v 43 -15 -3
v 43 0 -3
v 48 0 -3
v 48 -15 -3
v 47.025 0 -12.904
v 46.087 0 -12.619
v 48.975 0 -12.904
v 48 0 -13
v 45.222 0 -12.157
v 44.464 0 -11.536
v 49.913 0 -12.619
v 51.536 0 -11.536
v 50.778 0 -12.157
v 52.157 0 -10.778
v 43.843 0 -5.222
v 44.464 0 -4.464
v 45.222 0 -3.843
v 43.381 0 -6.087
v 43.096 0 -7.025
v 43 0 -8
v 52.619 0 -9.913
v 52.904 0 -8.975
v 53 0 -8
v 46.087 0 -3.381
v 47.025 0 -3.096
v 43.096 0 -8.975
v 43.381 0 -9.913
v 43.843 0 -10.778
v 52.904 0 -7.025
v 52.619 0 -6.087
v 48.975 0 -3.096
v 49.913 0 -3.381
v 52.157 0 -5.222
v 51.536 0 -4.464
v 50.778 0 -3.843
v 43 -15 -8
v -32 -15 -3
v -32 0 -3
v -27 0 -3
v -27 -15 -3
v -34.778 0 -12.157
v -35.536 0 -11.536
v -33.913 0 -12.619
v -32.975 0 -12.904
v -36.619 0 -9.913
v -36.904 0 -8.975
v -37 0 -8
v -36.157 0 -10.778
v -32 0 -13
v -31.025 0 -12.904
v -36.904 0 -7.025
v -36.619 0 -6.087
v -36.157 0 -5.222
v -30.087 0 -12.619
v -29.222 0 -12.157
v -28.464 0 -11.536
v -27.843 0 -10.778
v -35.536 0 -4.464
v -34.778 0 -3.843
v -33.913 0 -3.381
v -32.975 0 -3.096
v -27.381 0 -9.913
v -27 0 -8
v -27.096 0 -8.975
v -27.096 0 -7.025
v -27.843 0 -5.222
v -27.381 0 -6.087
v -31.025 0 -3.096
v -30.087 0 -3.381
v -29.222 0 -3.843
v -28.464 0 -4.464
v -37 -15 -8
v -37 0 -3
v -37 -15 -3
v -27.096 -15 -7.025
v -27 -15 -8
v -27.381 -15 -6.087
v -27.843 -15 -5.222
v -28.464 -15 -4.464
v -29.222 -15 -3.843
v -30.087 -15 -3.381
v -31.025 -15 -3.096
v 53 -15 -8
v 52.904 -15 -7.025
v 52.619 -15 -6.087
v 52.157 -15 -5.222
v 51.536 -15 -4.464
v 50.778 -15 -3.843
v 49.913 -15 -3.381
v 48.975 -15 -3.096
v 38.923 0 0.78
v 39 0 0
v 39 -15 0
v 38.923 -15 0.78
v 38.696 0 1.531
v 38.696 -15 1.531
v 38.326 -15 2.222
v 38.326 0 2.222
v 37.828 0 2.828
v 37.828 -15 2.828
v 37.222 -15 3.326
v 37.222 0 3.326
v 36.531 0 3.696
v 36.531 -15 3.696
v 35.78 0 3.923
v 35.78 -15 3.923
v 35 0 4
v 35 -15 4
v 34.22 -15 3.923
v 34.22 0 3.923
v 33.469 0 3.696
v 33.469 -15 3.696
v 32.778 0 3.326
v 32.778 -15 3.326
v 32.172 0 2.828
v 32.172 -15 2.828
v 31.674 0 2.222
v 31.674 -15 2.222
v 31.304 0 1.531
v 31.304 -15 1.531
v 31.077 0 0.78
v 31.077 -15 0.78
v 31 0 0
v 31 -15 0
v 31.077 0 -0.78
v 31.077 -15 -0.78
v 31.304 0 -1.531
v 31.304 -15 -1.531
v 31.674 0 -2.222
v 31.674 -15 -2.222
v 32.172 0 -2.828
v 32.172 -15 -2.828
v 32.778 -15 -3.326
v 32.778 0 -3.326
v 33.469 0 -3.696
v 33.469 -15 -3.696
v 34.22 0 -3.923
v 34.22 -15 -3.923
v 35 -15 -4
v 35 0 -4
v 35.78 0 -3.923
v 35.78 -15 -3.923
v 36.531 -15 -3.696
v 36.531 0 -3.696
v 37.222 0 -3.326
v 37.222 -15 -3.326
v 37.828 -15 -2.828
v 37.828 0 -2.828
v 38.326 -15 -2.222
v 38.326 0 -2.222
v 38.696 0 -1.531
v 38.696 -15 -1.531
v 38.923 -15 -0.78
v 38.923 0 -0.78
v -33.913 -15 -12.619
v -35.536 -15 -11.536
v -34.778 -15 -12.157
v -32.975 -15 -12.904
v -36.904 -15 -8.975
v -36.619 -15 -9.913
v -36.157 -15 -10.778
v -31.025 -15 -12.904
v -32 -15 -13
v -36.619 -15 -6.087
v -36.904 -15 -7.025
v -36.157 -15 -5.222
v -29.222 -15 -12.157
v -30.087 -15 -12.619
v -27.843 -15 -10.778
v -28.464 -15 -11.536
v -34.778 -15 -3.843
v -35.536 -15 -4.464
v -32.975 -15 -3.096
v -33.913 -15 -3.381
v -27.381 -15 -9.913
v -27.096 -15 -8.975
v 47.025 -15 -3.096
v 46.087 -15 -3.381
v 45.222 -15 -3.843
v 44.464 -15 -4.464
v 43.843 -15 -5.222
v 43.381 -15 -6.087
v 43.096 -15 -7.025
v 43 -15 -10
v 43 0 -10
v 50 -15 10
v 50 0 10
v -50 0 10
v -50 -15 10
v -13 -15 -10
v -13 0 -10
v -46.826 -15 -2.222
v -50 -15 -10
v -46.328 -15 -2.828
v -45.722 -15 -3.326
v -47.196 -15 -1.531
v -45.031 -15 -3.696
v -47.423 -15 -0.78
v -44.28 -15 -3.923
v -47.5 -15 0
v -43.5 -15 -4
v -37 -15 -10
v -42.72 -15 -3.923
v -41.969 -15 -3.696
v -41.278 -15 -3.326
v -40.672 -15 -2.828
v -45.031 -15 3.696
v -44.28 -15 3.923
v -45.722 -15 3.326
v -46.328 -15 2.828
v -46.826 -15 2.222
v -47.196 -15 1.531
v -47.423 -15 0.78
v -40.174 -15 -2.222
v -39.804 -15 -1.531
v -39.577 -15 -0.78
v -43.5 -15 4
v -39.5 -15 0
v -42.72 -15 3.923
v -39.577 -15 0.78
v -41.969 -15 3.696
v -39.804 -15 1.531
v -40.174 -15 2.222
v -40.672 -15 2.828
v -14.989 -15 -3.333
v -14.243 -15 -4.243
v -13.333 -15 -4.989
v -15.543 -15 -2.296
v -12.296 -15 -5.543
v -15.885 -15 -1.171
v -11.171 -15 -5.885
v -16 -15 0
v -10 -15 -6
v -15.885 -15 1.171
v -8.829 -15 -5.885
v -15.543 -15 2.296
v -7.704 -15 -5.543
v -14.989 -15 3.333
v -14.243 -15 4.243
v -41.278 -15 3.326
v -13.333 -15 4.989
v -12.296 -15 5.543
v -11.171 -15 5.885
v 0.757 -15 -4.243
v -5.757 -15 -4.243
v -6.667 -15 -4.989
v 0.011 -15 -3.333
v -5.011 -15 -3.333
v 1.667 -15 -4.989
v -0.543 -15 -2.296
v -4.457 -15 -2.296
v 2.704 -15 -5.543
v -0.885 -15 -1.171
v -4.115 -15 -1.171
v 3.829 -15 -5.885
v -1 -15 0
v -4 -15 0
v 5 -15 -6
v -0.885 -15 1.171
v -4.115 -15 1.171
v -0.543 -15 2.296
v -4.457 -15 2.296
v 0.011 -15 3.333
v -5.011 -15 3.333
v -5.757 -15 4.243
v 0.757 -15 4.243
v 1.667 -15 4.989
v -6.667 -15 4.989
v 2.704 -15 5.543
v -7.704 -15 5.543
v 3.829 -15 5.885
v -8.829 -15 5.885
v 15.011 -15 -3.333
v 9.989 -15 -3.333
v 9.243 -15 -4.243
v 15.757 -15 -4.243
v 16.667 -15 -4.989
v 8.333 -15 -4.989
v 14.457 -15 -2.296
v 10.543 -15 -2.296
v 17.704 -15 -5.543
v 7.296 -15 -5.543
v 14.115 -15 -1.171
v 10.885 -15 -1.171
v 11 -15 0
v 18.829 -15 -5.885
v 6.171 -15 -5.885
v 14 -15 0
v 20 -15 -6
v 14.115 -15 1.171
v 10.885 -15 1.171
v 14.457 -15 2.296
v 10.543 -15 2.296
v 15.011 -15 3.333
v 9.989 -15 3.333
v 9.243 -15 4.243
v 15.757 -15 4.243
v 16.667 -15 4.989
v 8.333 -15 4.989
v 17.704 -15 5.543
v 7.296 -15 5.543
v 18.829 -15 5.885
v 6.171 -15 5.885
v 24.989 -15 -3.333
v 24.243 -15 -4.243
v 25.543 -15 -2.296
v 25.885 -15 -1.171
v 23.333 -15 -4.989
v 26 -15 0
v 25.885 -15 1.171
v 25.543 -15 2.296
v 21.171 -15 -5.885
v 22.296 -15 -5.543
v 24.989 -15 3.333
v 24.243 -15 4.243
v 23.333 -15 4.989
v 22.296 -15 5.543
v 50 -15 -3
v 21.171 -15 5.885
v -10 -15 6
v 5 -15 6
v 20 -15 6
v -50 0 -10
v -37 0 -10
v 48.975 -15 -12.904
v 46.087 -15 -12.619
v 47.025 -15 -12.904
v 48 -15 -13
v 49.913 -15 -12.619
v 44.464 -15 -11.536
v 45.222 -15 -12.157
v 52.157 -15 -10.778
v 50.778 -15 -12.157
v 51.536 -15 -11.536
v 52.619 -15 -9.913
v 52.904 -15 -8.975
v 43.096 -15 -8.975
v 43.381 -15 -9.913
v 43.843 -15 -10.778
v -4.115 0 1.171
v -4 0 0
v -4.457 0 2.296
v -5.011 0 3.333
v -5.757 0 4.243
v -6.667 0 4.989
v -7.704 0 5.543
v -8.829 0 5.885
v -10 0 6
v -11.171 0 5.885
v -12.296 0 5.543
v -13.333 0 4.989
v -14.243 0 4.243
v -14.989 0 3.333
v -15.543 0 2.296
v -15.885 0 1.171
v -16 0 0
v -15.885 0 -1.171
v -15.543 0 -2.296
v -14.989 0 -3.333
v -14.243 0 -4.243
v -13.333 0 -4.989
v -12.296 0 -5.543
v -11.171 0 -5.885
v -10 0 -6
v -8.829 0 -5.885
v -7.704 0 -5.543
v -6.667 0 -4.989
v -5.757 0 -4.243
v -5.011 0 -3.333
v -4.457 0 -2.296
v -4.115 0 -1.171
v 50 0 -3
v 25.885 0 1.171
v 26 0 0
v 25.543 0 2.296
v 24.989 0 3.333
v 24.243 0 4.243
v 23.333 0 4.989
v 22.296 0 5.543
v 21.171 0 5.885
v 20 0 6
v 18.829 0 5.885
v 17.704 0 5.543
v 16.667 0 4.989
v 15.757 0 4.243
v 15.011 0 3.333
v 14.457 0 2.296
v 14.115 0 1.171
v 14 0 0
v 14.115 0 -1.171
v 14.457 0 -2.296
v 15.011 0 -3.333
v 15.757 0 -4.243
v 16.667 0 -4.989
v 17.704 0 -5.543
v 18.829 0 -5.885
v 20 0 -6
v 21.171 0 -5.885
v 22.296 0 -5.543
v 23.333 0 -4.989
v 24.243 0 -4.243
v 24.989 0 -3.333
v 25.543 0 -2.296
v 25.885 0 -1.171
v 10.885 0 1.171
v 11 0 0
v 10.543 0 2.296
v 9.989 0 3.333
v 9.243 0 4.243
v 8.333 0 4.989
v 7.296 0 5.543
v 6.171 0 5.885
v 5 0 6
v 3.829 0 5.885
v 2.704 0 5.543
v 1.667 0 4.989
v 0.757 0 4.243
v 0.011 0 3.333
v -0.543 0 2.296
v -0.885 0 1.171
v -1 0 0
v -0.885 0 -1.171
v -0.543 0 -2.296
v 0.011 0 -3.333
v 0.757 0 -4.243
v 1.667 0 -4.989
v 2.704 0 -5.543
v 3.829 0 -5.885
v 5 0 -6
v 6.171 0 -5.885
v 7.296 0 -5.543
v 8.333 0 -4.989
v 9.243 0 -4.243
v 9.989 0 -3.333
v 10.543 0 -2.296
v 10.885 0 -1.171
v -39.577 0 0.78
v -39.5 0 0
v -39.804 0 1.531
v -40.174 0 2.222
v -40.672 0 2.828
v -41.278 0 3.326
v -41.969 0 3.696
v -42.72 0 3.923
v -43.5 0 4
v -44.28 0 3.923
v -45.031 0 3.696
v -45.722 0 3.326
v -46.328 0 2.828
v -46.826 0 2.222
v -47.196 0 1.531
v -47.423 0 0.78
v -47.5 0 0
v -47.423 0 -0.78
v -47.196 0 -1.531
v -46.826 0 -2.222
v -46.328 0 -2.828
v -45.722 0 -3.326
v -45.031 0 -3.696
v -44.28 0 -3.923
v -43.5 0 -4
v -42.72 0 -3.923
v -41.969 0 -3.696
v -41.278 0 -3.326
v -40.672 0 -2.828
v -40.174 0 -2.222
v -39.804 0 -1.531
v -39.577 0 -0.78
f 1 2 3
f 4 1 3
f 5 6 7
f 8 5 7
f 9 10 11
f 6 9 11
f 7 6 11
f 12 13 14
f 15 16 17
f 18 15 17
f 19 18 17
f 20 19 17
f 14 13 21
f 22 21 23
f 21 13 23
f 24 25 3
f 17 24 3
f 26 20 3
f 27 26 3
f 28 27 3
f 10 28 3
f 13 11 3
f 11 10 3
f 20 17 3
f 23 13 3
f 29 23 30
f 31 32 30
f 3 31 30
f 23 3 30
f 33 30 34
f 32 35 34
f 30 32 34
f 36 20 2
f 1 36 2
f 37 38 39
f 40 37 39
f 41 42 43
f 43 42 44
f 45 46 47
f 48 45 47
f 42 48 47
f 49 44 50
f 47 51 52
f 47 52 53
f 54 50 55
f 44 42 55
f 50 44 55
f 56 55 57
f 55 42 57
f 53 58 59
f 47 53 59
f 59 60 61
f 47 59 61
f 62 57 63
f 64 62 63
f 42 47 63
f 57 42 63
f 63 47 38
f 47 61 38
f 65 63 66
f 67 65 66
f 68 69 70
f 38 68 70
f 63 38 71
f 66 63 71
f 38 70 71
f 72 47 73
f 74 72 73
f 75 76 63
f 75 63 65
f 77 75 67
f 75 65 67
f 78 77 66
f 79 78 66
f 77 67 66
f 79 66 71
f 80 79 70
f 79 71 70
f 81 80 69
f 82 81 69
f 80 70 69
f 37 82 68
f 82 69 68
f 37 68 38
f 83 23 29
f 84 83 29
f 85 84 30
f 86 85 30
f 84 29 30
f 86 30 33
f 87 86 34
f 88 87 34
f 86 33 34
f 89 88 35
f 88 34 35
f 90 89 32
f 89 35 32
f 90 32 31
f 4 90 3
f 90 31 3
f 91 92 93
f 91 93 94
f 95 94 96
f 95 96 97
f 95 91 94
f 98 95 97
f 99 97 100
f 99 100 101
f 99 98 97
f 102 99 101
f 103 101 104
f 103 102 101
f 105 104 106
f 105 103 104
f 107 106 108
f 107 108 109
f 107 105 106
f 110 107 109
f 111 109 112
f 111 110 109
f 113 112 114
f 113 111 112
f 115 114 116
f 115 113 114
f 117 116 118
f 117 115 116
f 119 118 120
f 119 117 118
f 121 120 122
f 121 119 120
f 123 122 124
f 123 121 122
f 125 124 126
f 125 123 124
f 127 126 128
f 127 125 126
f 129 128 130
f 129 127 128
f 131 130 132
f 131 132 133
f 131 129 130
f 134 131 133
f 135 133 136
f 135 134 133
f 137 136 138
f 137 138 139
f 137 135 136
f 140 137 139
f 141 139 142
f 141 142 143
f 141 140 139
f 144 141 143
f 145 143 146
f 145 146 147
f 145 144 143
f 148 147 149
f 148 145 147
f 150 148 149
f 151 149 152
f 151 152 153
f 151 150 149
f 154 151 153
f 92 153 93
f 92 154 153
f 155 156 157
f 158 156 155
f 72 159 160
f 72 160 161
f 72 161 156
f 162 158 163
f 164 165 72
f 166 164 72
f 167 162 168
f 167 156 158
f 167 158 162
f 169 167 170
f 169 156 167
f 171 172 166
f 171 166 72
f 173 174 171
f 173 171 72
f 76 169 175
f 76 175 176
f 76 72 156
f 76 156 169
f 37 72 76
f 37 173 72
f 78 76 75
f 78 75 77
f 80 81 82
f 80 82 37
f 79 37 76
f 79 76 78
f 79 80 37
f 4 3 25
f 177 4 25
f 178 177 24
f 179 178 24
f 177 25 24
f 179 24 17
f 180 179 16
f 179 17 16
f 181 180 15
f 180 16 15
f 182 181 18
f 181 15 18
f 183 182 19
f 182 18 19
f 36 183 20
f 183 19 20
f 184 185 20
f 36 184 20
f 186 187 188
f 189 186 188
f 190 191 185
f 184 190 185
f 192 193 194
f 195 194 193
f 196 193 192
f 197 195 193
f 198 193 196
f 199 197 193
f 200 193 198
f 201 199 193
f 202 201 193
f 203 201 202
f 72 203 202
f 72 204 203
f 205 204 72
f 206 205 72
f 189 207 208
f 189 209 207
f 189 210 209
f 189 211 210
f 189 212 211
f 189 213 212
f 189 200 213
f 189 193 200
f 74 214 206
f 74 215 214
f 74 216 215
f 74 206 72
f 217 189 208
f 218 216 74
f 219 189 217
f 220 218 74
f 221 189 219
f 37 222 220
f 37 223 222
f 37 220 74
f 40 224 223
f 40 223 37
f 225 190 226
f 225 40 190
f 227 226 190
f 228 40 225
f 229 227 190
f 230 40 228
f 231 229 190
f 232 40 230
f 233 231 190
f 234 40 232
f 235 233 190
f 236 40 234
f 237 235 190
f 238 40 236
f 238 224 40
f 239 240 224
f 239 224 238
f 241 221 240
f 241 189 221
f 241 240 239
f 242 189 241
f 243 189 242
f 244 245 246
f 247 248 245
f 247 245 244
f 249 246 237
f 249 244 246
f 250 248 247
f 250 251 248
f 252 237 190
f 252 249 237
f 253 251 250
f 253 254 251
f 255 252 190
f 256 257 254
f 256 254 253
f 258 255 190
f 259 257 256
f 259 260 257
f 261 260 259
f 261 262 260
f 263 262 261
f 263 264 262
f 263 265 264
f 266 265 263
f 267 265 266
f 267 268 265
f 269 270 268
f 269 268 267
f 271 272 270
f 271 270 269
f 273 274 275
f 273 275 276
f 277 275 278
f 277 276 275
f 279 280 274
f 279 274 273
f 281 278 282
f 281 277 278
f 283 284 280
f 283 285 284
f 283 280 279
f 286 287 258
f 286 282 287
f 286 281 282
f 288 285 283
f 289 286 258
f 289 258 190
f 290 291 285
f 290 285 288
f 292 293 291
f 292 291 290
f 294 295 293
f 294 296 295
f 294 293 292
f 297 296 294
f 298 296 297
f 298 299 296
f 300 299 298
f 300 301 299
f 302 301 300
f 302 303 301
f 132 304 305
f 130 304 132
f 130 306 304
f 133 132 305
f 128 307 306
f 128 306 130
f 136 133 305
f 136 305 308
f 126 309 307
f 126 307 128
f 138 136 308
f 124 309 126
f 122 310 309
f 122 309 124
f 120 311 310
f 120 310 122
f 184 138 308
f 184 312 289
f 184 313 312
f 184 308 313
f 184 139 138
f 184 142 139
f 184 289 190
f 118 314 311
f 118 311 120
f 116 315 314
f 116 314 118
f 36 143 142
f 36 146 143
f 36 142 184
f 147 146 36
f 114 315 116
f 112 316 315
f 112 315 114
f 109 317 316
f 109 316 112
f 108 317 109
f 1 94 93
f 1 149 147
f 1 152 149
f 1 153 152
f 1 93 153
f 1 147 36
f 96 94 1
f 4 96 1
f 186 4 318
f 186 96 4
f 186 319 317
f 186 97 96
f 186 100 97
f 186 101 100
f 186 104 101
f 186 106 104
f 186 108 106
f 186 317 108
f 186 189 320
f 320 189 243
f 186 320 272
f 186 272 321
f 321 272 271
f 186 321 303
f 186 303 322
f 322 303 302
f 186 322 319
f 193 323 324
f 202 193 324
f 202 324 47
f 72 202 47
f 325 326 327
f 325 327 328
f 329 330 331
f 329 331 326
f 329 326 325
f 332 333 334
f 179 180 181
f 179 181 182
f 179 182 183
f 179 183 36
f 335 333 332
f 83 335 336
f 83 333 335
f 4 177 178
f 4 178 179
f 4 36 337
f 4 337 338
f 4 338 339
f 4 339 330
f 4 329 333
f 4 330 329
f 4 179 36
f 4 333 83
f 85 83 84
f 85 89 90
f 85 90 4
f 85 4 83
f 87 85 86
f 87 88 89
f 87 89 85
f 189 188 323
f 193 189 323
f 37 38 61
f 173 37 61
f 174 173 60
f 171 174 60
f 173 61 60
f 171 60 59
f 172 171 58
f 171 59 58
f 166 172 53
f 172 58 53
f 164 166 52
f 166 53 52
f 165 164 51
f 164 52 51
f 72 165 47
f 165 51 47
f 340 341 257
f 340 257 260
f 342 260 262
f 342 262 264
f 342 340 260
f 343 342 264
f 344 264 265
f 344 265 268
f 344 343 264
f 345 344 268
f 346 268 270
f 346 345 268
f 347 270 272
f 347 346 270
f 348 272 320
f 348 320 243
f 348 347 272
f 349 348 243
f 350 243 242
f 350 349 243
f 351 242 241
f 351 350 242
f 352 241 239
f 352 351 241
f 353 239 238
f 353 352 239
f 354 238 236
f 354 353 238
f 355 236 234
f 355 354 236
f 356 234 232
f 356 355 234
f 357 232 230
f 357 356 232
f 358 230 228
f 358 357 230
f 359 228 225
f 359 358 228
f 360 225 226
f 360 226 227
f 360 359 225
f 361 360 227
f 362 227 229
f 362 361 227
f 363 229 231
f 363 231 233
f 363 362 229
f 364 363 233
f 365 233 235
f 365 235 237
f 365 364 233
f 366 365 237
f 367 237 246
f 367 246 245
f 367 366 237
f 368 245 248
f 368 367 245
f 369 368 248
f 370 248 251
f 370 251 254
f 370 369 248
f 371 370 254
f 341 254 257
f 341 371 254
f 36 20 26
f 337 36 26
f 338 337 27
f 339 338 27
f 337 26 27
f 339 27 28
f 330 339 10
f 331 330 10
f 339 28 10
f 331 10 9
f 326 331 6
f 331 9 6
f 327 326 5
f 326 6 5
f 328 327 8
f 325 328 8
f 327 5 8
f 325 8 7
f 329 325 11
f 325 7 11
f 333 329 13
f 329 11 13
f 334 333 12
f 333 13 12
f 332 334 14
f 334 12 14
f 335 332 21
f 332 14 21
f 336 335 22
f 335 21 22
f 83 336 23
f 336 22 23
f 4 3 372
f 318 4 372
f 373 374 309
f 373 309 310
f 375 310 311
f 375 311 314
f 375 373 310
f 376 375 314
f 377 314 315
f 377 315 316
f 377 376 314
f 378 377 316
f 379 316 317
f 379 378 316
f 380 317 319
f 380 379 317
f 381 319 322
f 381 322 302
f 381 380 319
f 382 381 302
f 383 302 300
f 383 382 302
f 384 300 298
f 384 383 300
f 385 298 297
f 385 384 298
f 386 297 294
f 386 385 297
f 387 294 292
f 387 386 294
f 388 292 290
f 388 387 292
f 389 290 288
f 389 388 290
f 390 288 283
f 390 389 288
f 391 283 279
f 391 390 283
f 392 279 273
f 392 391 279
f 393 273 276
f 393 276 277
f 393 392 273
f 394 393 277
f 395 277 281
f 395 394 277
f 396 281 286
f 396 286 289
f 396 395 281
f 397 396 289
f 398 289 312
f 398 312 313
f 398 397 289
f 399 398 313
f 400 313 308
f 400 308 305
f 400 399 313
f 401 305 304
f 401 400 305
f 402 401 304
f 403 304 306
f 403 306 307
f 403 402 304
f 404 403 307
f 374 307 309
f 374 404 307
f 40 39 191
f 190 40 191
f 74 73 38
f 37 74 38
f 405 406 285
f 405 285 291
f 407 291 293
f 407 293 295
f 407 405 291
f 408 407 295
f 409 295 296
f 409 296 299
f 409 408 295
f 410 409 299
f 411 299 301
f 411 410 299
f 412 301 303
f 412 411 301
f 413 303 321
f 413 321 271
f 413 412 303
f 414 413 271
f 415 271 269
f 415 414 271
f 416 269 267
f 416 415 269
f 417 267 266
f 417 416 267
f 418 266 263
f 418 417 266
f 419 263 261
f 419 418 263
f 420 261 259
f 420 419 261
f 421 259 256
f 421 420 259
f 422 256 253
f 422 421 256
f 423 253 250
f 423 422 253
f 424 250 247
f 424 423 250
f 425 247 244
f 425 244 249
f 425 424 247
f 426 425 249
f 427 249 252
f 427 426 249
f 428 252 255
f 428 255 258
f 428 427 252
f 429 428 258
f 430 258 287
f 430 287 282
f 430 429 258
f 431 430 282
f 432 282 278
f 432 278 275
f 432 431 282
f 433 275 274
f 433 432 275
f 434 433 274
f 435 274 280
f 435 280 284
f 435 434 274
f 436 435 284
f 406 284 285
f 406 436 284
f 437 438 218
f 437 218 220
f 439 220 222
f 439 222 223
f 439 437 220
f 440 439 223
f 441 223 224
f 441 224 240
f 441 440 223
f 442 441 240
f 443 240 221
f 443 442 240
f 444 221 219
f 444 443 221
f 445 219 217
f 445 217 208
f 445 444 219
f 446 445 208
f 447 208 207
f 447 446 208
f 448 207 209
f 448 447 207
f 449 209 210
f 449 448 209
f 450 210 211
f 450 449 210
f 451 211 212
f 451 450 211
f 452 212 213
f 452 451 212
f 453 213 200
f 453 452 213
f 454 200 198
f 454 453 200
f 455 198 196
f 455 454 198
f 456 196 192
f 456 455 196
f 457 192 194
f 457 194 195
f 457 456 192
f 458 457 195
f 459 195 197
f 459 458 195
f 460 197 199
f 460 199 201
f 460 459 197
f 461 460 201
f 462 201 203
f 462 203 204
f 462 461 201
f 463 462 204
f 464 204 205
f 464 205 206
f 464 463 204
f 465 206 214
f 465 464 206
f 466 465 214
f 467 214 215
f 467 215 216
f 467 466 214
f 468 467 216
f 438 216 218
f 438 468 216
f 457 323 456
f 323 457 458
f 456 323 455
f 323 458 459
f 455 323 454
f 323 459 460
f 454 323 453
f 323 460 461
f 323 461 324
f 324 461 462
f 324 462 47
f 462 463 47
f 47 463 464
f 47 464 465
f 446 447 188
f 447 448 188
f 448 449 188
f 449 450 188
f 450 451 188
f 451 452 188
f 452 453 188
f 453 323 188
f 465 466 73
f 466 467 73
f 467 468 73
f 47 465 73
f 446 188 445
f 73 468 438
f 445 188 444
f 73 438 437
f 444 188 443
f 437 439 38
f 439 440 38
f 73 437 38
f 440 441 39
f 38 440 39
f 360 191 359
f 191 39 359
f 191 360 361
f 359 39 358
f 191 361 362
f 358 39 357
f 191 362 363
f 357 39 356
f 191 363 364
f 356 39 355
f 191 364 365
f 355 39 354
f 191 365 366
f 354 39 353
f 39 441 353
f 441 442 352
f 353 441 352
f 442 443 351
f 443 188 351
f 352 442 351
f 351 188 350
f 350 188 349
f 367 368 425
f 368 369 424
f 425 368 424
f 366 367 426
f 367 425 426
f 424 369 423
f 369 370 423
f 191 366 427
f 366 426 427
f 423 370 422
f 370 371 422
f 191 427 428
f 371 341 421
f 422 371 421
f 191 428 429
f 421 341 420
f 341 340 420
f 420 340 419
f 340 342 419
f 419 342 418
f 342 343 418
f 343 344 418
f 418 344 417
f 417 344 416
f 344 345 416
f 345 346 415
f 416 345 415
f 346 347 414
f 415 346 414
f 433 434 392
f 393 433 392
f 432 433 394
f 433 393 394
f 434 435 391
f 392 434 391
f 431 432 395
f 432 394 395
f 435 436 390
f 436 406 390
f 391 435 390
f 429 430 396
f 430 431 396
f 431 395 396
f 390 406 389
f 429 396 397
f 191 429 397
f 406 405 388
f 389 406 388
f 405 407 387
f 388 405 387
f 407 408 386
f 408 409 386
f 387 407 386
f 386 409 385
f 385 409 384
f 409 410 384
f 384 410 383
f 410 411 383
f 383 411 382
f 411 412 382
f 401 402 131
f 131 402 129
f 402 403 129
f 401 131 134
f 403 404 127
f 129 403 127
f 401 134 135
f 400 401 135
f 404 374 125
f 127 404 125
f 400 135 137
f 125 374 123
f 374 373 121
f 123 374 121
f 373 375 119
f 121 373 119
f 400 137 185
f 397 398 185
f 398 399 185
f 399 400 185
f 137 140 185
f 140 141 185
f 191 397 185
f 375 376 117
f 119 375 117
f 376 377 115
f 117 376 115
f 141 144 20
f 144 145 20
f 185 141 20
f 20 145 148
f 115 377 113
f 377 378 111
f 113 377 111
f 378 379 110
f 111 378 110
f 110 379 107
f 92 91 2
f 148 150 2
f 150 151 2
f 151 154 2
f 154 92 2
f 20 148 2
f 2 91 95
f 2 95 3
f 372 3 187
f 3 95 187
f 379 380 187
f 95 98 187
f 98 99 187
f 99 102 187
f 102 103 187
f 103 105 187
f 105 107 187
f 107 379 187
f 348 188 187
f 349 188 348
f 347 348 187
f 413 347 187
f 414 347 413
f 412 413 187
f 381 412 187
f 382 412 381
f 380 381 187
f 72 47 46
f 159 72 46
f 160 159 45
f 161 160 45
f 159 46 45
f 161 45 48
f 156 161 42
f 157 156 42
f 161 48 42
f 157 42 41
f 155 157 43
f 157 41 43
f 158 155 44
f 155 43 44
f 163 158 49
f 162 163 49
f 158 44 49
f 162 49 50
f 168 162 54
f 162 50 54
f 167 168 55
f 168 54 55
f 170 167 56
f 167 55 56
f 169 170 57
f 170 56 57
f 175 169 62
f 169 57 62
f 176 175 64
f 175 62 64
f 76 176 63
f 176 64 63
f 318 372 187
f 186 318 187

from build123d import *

# Parameters (mm, degrees)
F0_R     = 4
F0_R_2   = 6
F1_DEPTH = 15


with BuildPart() as f1:
    # F0 (on Front) → F1 (new body)
    with BuildSketch(Plane.XZ):
        Polygon((-13, -10), (43, -10), (43, -8), (43, -3), (48, -3), (50, -3), (50, 10), (-50, 10), (-50, -10), (-37, -10), (-37, -8), (-37, -3), (-32, -3), (-27, -3), align=None)
        with Locations((-43.5, 0)):
            Circle(F0_R, mode=Mode.SUBTRACT)
        with Locations((-10, 0)):
            Circle(F0_R_2, mode=Mode.SUBTRACT)
        with Locations((5, 0)):
            Circle(F0_R_2, mode=Mode.SUBTRACT)
        with Locations((20, 0)):
            Circle(F0_R_2, mode=Mode.SUBTRACT)
        with Locations((35, 0)):
            Circle(F0_R, mode=Mode.SUBTRACT)
        with BuildLine():
            ThreePointArc((-27, -8), (-28.464466, -4.464466), (-32, -3))
            ThreePointArc((-32, -3), (-35.535534, -4.464466), (-37, -8))
            ThreePointArc((-37, -8), (-32, -13), (-27, -8))
        make_face()
        with BuildLine():
            ThreePointArc((48, -3), (44.464466, -4.464466), (43, -8))
            ThreePointArc((43, -8), (48, -13), (53, -8))
            ThreePointArc((53, -8), (51.535534, -4.464466), (48, -3))
        make_face()
    extrude(amount=F1_DEPTH)


solid = f1.part
